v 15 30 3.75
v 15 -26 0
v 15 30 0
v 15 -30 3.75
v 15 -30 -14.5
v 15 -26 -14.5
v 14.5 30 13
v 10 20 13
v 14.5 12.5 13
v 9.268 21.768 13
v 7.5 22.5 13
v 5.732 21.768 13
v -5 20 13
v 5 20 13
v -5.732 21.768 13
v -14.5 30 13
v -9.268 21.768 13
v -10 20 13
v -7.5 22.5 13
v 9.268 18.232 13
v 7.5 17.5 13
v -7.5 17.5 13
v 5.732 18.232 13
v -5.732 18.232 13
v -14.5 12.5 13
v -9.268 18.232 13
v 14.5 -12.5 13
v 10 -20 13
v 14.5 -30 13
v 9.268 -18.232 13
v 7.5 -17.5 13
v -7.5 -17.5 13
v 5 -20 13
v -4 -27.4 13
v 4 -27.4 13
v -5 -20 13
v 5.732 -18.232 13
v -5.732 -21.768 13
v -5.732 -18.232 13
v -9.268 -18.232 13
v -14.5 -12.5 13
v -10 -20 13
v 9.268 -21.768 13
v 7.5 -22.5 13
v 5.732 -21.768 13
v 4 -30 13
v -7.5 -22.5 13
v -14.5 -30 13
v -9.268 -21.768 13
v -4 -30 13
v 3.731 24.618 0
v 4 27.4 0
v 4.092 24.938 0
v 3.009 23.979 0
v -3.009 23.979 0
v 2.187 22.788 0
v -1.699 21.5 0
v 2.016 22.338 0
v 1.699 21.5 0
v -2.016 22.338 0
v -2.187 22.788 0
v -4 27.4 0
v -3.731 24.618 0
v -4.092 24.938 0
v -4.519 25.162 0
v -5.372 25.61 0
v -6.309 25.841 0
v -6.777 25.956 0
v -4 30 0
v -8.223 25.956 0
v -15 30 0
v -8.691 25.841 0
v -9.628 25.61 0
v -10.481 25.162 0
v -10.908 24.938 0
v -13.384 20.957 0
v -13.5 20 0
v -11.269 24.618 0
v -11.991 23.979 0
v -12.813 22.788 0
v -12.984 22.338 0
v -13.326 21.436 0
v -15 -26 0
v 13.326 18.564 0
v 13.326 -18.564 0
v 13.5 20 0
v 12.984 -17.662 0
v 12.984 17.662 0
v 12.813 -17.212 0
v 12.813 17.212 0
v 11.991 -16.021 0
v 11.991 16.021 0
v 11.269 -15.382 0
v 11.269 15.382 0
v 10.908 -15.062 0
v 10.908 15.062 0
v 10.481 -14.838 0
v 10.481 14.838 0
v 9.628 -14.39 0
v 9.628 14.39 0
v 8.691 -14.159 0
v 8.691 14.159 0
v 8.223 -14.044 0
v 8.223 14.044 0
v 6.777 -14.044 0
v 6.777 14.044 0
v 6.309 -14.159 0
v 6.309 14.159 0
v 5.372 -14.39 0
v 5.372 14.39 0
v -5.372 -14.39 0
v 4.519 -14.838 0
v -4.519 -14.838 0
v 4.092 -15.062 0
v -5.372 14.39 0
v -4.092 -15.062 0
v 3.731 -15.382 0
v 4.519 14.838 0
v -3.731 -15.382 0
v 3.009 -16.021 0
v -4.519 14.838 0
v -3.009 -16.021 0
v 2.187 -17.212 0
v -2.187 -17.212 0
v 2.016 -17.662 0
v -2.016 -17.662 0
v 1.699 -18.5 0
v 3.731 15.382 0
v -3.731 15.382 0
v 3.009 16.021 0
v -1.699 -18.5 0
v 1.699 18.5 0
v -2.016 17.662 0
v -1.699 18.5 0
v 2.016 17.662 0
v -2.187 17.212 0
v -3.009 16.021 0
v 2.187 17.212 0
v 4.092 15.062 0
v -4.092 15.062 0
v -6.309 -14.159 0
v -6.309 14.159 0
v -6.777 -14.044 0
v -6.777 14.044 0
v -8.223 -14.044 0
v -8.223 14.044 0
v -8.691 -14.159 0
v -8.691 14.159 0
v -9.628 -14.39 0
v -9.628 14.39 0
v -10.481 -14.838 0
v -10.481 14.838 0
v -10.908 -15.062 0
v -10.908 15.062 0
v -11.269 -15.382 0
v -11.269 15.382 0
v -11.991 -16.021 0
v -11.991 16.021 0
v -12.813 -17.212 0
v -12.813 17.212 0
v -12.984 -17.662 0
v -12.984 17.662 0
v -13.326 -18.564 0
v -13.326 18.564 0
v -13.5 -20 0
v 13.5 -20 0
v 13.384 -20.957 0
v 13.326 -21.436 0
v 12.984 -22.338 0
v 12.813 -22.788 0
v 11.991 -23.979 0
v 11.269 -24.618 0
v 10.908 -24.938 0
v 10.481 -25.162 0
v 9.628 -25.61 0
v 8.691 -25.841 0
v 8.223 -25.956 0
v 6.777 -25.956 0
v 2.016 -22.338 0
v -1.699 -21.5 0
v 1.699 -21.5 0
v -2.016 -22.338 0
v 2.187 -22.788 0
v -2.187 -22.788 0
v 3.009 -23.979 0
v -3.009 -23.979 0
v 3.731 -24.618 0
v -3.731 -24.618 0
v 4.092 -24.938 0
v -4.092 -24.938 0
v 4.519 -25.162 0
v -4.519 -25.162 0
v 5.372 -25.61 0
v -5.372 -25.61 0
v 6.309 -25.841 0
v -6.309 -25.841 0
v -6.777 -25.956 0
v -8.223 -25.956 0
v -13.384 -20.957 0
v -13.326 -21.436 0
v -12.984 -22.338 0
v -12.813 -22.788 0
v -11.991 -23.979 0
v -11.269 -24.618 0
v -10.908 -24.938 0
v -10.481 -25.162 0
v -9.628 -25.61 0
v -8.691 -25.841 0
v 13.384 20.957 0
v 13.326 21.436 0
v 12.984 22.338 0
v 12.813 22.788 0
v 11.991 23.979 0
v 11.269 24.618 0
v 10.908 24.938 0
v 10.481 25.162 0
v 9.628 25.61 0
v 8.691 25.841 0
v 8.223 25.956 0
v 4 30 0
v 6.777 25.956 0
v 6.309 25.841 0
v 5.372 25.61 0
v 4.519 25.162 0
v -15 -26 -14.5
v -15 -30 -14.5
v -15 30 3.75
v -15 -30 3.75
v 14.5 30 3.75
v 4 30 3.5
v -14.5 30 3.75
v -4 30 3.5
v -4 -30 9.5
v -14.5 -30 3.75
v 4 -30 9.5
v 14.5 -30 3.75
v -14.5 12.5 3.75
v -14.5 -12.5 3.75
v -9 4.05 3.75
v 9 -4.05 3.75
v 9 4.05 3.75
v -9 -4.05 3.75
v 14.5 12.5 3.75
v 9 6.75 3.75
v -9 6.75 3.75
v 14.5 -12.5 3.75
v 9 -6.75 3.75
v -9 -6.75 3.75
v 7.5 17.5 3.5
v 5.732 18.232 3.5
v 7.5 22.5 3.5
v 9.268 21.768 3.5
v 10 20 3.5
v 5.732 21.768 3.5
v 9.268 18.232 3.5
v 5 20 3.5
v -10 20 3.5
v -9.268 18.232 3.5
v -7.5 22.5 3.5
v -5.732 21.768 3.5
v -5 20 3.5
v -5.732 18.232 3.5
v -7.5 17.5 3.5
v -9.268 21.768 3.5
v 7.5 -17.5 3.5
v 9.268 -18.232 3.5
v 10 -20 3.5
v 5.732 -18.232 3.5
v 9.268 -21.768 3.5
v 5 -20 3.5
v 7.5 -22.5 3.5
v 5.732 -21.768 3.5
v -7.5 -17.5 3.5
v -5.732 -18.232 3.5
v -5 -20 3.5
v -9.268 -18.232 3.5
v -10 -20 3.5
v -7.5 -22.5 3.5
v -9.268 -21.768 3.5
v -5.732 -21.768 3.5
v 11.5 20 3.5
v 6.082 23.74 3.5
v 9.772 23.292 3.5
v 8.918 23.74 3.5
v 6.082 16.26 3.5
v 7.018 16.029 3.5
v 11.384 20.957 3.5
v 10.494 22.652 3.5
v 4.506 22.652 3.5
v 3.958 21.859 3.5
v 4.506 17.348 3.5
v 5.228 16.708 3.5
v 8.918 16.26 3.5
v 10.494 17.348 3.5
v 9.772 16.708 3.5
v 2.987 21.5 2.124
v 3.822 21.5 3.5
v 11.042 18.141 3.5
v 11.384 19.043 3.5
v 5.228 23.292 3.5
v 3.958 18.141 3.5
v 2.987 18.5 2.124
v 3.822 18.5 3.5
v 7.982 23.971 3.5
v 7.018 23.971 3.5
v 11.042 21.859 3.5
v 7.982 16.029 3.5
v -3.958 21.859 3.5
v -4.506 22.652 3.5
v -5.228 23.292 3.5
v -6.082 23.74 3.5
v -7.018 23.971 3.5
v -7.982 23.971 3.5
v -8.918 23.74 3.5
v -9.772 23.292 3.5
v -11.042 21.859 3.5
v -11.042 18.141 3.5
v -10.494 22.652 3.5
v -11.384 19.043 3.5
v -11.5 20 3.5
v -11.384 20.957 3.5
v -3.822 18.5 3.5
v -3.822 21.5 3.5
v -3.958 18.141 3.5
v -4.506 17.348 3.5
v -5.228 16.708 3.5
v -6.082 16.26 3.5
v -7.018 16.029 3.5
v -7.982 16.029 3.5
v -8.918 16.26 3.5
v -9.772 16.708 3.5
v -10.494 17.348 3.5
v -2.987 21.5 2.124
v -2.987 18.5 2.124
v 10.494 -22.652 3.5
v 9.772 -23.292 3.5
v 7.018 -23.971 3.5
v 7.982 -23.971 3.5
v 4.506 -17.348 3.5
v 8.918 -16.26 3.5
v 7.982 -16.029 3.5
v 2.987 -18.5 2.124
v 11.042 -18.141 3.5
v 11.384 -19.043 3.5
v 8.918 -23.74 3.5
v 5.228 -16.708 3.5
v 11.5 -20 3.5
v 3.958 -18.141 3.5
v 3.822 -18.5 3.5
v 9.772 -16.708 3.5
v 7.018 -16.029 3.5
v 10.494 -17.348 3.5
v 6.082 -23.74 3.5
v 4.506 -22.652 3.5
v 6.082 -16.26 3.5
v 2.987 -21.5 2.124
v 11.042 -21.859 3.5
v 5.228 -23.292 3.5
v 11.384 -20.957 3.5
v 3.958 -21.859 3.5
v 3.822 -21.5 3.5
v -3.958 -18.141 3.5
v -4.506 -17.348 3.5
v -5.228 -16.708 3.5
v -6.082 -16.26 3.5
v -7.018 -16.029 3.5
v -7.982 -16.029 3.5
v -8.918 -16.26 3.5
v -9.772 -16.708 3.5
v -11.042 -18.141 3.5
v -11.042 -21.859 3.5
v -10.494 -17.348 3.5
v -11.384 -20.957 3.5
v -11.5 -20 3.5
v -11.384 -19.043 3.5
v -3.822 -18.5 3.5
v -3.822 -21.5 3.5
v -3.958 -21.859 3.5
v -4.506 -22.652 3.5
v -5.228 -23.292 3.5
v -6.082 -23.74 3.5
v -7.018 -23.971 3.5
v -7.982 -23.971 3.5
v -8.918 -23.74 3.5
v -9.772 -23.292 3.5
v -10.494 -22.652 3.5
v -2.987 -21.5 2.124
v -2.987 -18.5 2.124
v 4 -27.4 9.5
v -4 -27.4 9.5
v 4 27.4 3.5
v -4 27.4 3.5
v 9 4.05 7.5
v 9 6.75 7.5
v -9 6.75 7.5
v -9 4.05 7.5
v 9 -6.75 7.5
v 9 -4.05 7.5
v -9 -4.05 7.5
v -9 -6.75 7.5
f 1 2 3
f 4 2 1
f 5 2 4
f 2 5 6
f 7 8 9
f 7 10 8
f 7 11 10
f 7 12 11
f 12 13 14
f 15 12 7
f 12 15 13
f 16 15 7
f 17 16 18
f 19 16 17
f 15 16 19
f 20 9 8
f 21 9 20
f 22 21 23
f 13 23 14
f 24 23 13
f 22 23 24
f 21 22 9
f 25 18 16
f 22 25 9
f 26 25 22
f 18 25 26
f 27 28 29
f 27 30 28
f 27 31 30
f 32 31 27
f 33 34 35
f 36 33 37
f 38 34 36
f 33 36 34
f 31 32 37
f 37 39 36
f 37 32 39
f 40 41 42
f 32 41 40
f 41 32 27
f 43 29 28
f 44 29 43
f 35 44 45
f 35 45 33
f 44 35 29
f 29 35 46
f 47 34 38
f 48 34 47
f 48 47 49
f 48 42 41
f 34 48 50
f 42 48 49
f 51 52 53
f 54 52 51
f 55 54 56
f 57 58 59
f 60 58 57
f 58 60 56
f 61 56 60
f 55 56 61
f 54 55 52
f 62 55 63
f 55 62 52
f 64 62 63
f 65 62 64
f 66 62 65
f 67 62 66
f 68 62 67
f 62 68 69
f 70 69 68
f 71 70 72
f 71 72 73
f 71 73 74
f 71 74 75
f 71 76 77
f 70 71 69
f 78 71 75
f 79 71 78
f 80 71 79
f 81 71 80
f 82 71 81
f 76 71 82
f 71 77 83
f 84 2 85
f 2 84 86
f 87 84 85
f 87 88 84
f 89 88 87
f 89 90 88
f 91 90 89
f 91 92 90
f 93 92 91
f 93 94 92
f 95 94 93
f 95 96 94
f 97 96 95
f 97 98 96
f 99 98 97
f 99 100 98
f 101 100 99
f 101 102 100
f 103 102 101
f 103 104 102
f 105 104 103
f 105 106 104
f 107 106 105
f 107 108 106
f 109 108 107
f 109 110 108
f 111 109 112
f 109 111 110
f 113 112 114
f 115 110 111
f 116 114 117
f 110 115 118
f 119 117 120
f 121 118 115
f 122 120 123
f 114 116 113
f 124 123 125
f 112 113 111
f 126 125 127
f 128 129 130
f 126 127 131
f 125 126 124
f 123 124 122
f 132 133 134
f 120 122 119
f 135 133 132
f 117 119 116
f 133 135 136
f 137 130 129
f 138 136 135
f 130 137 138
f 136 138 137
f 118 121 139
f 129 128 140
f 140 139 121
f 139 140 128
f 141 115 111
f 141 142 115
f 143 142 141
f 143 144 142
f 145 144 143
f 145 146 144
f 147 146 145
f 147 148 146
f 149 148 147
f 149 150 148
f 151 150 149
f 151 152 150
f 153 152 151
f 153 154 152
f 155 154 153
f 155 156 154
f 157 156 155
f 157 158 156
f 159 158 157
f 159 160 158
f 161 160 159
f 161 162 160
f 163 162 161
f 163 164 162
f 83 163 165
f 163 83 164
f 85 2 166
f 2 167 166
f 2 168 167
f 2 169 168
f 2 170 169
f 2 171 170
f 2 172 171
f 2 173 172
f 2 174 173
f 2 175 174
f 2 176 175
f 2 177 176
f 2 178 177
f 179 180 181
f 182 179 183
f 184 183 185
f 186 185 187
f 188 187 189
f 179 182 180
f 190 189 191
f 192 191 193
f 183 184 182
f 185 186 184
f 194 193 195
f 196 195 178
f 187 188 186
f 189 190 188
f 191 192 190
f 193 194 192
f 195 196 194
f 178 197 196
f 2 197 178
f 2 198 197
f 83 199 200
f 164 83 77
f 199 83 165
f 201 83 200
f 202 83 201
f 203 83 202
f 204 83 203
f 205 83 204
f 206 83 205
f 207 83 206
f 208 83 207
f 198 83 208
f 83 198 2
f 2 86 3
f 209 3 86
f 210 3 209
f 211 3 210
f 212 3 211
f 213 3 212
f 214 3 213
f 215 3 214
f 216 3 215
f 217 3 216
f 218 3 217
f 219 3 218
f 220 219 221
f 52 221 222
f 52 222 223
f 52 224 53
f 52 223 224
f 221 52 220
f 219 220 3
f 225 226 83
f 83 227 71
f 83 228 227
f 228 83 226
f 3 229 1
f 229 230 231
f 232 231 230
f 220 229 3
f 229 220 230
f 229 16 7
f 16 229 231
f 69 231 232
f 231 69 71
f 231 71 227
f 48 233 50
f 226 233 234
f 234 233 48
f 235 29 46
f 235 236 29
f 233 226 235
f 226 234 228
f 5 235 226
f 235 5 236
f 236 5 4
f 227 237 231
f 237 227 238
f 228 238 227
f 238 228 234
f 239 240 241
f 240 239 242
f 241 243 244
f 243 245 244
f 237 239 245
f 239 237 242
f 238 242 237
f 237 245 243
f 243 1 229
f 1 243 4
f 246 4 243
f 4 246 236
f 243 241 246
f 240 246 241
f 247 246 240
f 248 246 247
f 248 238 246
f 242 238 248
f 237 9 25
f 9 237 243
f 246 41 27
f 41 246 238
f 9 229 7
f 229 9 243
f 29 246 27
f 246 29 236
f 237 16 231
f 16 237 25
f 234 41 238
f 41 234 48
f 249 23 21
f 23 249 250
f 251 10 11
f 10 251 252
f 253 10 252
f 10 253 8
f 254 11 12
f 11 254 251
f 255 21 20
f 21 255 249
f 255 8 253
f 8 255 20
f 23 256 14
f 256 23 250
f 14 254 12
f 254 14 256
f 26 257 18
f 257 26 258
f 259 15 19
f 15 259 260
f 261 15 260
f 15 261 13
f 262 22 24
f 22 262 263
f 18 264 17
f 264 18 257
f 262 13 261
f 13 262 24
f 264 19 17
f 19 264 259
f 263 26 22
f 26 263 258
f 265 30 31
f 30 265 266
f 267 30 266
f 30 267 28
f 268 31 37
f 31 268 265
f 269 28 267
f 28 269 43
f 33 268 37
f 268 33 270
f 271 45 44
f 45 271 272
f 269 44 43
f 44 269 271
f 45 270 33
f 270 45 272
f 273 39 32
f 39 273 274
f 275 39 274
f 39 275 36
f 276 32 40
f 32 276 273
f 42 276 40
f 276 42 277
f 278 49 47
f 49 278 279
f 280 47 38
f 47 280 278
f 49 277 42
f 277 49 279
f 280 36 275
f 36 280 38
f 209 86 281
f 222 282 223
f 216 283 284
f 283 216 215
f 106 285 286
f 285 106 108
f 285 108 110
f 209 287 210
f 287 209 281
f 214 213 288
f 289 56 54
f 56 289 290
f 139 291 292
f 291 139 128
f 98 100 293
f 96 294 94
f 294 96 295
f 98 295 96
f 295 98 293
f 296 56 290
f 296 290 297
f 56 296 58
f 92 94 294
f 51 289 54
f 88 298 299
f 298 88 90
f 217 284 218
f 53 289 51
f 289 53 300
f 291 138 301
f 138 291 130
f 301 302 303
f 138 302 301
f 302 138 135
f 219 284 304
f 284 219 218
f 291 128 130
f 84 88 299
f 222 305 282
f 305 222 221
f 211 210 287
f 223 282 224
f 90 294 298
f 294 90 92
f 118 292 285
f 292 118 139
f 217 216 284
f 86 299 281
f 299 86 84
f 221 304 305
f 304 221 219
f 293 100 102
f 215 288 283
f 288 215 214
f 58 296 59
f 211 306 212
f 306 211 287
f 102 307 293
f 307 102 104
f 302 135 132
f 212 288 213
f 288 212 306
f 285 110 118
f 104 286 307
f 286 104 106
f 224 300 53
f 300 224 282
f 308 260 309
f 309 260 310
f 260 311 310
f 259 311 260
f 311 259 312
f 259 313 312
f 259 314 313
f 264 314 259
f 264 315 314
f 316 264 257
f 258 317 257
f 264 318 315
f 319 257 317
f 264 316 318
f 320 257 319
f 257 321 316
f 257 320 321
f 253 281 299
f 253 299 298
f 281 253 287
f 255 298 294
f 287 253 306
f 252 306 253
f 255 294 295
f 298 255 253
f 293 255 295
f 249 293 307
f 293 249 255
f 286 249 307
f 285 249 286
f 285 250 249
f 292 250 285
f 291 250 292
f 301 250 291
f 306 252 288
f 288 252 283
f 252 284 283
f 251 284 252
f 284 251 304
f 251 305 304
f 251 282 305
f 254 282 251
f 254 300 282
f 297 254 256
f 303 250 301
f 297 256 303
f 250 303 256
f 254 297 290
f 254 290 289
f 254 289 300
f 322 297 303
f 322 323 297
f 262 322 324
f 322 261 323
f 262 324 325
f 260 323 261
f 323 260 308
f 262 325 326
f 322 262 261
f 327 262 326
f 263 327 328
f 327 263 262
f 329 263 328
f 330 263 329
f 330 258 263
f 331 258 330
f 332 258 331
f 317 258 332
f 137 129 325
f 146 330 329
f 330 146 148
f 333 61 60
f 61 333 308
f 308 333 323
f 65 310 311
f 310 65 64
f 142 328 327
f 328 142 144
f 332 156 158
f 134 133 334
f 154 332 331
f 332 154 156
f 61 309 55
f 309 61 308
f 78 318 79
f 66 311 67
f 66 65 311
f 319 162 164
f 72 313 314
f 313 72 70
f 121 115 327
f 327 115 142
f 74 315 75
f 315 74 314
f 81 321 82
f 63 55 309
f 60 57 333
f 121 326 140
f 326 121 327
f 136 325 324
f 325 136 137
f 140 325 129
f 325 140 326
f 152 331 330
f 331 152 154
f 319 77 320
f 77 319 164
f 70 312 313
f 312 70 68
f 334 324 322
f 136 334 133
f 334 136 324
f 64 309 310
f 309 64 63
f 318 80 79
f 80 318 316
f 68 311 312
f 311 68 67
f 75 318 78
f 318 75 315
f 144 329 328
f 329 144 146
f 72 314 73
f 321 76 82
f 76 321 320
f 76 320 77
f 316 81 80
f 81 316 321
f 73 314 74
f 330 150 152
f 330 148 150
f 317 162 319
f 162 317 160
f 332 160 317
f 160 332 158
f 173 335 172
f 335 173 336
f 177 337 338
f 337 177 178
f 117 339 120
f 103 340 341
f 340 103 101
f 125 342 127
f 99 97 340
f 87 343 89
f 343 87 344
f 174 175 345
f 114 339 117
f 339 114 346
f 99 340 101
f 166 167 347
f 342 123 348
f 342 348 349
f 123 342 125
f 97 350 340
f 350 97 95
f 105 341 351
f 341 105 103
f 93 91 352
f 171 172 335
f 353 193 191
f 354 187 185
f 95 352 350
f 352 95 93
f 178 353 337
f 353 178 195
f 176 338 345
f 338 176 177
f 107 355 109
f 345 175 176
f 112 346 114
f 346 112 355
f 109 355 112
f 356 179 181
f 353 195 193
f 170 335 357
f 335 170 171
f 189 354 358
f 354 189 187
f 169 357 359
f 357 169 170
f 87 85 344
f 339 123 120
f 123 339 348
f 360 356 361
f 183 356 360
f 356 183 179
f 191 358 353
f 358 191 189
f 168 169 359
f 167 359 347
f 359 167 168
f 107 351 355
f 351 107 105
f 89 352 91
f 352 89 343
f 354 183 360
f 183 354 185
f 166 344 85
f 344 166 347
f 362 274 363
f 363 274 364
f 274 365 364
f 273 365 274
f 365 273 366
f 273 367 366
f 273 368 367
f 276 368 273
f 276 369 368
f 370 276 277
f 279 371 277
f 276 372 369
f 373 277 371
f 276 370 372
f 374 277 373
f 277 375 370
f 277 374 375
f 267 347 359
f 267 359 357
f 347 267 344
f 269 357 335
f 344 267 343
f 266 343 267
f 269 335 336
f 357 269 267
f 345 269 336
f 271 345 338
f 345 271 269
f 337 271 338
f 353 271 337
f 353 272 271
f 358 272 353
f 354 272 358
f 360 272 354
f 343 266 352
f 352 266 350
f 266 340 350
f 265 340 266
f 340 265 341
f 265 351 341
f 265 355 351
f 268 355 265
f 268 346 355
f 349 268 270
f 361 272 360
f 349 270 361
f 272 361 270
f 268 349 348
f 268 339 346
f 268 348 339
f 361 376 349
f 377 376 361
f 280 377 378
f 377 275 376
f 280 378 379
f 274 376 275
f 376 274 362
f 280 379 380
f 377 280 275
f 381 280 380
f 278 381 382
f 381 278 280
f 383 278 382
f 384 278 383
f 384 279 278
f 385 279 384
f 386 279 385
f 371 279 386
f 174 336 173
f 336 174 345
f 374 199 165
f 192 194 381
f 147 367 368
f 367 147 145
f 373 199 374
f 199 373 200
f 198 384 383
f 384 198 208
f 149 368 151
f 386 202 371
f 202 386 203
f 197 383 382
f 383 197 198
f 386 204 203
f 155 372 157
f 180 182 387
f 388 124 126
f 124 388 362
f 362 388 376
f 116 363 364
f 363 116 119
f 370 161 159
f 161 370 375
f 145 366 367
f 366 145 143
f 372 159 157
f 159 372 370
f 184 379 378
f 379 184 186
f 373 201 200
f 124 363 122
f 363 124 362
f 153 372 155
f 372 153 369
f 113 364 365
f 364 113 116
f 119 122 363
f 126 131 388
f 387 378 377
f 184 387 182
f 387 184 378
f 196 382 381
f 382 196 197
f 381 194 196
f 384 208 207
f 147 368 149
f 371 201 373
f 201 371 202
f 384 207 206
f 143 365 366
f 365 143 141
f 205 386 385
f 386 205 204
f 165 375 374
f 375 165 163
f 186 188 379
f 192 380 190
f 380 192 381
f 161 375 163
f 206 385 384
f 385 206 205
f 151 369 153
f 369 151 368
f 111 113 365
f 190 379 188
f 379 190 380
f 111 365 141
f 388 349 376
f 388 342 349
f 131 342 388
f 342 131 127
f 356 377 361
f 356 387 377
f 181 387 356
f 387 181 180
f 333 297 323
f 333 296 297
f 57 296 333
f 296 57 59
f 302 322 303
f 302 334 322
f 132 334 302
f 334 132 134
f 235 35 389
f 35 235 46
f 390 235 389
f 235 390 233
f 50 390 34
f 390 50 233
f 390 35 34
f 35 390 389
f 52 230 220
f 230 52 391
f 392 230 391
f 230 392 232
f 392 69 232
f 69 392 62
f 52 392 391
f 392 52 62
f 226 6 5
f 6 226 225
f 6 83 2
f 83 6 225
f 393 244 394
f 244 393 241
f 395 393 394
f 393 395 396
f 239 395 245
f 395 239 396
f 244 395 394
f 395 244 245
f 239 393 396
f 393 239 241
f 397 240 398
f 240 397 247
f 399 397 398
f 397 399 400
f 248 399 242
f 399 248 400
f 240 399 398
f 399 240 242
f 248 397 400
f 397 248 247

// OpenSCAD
//block shape
x=30;
y=60;
z=13;

// track channel
f=x+10;
g=25;
h=9.5;
// block top
e=20;
r=y+10;
t=16.5;

// spacing of screw holes
cx=15;
cy=40;
dx=15;
dy=45;


difference()
{
    translate([0,0,z]/2) cube ([x,y,z],center=true);
    translate([0,0,z+4]/2) cube([f,g,h],center=true);
    translate([49,0,z+11]/2) cube ([e,r,t],center=true);
        translate([-49,0,z+11]/2) cube ([e,r,t],center=true);

  translate([cx,cy,0]/2) cylinder(d=5, h=50,  center=true);
  translate([-cx,cy,0]/2) cylinder(d=5, h=50,  center=true);
    translate([cx,-cy,0]/2) cylinder(d=5, h=50,  center=true);
    translate([-cx,-cy,0]/2) cylinder(d=5, h=50,  center=true);
  translate([dy,dy,0]/2) cylinder(d=5, h=50,  center=true);
  translate([-dy,dy,0]/2) cylinder(d=5, h=50,  center=true);
    translate([dy,-dy,0]/2) cylinder(d=5, h=50,  center=true);
    translate([-dy,-dy,0]/2) cylinder(d=5, h=50,  center=true);  
    translate([dy,dx,0]/2) cylinder(d=5, h=50,  center=true);
  translate([-dy,dx,0]/2) cylinder(d=5, h=50,  center=true);  
  translate([dy,-dx,0]/2) cylinder(d=5, h=50,  center=true);
  translate([-dy,-dx,0]/2) cylinder(d=5, h=50,  center=true);  
    
 translate([cx,cy,0]/2)  cylinder(d1=16, d2=8, h=7,  center=true);
 translate([-cx,cy,0]/2) cylinder(d1=16, d2=8, h=7, center=true);
    translate([cx,-cy,0]/2) cylinder(d1=16, d2=8, h=7,  center=true);
    translate([-cx,-cy,0]/2) cylinder(d1=16, d2=8, h=7,  center=true);    
// zip tie knotches    
    translate([0,-cy/2,11.5-10]) cube([18,3,4],center=true);
    translate([0,cy/2,11.5-10]) cube([18,3,4],center=true);
// removal knotches
       translate([0,-(6.8+51)/2,11.5]) cube([8,3,4],center=true);
   translate([0,(6.8+51)/2,11.5-10]) cube([8,3,4],center=true);
   translate([(6.8+51)/2,0,11.5-11]) cube([3,8,2],center=true);
   translate([-(6.8+51)/2,0,11.5-11]) cube([3,8,2],center=true);
}

difference ()
{
    translate([0,-28,-7]) cube([30,4,15],center=true);
    
    
}

translate([0,(6.8+4)/2,z-8]) cube([18,2.7,5],center=true);
translate([0,-(6.8+4)/2,z-8]) cube([18,2.7,5],center=true);
